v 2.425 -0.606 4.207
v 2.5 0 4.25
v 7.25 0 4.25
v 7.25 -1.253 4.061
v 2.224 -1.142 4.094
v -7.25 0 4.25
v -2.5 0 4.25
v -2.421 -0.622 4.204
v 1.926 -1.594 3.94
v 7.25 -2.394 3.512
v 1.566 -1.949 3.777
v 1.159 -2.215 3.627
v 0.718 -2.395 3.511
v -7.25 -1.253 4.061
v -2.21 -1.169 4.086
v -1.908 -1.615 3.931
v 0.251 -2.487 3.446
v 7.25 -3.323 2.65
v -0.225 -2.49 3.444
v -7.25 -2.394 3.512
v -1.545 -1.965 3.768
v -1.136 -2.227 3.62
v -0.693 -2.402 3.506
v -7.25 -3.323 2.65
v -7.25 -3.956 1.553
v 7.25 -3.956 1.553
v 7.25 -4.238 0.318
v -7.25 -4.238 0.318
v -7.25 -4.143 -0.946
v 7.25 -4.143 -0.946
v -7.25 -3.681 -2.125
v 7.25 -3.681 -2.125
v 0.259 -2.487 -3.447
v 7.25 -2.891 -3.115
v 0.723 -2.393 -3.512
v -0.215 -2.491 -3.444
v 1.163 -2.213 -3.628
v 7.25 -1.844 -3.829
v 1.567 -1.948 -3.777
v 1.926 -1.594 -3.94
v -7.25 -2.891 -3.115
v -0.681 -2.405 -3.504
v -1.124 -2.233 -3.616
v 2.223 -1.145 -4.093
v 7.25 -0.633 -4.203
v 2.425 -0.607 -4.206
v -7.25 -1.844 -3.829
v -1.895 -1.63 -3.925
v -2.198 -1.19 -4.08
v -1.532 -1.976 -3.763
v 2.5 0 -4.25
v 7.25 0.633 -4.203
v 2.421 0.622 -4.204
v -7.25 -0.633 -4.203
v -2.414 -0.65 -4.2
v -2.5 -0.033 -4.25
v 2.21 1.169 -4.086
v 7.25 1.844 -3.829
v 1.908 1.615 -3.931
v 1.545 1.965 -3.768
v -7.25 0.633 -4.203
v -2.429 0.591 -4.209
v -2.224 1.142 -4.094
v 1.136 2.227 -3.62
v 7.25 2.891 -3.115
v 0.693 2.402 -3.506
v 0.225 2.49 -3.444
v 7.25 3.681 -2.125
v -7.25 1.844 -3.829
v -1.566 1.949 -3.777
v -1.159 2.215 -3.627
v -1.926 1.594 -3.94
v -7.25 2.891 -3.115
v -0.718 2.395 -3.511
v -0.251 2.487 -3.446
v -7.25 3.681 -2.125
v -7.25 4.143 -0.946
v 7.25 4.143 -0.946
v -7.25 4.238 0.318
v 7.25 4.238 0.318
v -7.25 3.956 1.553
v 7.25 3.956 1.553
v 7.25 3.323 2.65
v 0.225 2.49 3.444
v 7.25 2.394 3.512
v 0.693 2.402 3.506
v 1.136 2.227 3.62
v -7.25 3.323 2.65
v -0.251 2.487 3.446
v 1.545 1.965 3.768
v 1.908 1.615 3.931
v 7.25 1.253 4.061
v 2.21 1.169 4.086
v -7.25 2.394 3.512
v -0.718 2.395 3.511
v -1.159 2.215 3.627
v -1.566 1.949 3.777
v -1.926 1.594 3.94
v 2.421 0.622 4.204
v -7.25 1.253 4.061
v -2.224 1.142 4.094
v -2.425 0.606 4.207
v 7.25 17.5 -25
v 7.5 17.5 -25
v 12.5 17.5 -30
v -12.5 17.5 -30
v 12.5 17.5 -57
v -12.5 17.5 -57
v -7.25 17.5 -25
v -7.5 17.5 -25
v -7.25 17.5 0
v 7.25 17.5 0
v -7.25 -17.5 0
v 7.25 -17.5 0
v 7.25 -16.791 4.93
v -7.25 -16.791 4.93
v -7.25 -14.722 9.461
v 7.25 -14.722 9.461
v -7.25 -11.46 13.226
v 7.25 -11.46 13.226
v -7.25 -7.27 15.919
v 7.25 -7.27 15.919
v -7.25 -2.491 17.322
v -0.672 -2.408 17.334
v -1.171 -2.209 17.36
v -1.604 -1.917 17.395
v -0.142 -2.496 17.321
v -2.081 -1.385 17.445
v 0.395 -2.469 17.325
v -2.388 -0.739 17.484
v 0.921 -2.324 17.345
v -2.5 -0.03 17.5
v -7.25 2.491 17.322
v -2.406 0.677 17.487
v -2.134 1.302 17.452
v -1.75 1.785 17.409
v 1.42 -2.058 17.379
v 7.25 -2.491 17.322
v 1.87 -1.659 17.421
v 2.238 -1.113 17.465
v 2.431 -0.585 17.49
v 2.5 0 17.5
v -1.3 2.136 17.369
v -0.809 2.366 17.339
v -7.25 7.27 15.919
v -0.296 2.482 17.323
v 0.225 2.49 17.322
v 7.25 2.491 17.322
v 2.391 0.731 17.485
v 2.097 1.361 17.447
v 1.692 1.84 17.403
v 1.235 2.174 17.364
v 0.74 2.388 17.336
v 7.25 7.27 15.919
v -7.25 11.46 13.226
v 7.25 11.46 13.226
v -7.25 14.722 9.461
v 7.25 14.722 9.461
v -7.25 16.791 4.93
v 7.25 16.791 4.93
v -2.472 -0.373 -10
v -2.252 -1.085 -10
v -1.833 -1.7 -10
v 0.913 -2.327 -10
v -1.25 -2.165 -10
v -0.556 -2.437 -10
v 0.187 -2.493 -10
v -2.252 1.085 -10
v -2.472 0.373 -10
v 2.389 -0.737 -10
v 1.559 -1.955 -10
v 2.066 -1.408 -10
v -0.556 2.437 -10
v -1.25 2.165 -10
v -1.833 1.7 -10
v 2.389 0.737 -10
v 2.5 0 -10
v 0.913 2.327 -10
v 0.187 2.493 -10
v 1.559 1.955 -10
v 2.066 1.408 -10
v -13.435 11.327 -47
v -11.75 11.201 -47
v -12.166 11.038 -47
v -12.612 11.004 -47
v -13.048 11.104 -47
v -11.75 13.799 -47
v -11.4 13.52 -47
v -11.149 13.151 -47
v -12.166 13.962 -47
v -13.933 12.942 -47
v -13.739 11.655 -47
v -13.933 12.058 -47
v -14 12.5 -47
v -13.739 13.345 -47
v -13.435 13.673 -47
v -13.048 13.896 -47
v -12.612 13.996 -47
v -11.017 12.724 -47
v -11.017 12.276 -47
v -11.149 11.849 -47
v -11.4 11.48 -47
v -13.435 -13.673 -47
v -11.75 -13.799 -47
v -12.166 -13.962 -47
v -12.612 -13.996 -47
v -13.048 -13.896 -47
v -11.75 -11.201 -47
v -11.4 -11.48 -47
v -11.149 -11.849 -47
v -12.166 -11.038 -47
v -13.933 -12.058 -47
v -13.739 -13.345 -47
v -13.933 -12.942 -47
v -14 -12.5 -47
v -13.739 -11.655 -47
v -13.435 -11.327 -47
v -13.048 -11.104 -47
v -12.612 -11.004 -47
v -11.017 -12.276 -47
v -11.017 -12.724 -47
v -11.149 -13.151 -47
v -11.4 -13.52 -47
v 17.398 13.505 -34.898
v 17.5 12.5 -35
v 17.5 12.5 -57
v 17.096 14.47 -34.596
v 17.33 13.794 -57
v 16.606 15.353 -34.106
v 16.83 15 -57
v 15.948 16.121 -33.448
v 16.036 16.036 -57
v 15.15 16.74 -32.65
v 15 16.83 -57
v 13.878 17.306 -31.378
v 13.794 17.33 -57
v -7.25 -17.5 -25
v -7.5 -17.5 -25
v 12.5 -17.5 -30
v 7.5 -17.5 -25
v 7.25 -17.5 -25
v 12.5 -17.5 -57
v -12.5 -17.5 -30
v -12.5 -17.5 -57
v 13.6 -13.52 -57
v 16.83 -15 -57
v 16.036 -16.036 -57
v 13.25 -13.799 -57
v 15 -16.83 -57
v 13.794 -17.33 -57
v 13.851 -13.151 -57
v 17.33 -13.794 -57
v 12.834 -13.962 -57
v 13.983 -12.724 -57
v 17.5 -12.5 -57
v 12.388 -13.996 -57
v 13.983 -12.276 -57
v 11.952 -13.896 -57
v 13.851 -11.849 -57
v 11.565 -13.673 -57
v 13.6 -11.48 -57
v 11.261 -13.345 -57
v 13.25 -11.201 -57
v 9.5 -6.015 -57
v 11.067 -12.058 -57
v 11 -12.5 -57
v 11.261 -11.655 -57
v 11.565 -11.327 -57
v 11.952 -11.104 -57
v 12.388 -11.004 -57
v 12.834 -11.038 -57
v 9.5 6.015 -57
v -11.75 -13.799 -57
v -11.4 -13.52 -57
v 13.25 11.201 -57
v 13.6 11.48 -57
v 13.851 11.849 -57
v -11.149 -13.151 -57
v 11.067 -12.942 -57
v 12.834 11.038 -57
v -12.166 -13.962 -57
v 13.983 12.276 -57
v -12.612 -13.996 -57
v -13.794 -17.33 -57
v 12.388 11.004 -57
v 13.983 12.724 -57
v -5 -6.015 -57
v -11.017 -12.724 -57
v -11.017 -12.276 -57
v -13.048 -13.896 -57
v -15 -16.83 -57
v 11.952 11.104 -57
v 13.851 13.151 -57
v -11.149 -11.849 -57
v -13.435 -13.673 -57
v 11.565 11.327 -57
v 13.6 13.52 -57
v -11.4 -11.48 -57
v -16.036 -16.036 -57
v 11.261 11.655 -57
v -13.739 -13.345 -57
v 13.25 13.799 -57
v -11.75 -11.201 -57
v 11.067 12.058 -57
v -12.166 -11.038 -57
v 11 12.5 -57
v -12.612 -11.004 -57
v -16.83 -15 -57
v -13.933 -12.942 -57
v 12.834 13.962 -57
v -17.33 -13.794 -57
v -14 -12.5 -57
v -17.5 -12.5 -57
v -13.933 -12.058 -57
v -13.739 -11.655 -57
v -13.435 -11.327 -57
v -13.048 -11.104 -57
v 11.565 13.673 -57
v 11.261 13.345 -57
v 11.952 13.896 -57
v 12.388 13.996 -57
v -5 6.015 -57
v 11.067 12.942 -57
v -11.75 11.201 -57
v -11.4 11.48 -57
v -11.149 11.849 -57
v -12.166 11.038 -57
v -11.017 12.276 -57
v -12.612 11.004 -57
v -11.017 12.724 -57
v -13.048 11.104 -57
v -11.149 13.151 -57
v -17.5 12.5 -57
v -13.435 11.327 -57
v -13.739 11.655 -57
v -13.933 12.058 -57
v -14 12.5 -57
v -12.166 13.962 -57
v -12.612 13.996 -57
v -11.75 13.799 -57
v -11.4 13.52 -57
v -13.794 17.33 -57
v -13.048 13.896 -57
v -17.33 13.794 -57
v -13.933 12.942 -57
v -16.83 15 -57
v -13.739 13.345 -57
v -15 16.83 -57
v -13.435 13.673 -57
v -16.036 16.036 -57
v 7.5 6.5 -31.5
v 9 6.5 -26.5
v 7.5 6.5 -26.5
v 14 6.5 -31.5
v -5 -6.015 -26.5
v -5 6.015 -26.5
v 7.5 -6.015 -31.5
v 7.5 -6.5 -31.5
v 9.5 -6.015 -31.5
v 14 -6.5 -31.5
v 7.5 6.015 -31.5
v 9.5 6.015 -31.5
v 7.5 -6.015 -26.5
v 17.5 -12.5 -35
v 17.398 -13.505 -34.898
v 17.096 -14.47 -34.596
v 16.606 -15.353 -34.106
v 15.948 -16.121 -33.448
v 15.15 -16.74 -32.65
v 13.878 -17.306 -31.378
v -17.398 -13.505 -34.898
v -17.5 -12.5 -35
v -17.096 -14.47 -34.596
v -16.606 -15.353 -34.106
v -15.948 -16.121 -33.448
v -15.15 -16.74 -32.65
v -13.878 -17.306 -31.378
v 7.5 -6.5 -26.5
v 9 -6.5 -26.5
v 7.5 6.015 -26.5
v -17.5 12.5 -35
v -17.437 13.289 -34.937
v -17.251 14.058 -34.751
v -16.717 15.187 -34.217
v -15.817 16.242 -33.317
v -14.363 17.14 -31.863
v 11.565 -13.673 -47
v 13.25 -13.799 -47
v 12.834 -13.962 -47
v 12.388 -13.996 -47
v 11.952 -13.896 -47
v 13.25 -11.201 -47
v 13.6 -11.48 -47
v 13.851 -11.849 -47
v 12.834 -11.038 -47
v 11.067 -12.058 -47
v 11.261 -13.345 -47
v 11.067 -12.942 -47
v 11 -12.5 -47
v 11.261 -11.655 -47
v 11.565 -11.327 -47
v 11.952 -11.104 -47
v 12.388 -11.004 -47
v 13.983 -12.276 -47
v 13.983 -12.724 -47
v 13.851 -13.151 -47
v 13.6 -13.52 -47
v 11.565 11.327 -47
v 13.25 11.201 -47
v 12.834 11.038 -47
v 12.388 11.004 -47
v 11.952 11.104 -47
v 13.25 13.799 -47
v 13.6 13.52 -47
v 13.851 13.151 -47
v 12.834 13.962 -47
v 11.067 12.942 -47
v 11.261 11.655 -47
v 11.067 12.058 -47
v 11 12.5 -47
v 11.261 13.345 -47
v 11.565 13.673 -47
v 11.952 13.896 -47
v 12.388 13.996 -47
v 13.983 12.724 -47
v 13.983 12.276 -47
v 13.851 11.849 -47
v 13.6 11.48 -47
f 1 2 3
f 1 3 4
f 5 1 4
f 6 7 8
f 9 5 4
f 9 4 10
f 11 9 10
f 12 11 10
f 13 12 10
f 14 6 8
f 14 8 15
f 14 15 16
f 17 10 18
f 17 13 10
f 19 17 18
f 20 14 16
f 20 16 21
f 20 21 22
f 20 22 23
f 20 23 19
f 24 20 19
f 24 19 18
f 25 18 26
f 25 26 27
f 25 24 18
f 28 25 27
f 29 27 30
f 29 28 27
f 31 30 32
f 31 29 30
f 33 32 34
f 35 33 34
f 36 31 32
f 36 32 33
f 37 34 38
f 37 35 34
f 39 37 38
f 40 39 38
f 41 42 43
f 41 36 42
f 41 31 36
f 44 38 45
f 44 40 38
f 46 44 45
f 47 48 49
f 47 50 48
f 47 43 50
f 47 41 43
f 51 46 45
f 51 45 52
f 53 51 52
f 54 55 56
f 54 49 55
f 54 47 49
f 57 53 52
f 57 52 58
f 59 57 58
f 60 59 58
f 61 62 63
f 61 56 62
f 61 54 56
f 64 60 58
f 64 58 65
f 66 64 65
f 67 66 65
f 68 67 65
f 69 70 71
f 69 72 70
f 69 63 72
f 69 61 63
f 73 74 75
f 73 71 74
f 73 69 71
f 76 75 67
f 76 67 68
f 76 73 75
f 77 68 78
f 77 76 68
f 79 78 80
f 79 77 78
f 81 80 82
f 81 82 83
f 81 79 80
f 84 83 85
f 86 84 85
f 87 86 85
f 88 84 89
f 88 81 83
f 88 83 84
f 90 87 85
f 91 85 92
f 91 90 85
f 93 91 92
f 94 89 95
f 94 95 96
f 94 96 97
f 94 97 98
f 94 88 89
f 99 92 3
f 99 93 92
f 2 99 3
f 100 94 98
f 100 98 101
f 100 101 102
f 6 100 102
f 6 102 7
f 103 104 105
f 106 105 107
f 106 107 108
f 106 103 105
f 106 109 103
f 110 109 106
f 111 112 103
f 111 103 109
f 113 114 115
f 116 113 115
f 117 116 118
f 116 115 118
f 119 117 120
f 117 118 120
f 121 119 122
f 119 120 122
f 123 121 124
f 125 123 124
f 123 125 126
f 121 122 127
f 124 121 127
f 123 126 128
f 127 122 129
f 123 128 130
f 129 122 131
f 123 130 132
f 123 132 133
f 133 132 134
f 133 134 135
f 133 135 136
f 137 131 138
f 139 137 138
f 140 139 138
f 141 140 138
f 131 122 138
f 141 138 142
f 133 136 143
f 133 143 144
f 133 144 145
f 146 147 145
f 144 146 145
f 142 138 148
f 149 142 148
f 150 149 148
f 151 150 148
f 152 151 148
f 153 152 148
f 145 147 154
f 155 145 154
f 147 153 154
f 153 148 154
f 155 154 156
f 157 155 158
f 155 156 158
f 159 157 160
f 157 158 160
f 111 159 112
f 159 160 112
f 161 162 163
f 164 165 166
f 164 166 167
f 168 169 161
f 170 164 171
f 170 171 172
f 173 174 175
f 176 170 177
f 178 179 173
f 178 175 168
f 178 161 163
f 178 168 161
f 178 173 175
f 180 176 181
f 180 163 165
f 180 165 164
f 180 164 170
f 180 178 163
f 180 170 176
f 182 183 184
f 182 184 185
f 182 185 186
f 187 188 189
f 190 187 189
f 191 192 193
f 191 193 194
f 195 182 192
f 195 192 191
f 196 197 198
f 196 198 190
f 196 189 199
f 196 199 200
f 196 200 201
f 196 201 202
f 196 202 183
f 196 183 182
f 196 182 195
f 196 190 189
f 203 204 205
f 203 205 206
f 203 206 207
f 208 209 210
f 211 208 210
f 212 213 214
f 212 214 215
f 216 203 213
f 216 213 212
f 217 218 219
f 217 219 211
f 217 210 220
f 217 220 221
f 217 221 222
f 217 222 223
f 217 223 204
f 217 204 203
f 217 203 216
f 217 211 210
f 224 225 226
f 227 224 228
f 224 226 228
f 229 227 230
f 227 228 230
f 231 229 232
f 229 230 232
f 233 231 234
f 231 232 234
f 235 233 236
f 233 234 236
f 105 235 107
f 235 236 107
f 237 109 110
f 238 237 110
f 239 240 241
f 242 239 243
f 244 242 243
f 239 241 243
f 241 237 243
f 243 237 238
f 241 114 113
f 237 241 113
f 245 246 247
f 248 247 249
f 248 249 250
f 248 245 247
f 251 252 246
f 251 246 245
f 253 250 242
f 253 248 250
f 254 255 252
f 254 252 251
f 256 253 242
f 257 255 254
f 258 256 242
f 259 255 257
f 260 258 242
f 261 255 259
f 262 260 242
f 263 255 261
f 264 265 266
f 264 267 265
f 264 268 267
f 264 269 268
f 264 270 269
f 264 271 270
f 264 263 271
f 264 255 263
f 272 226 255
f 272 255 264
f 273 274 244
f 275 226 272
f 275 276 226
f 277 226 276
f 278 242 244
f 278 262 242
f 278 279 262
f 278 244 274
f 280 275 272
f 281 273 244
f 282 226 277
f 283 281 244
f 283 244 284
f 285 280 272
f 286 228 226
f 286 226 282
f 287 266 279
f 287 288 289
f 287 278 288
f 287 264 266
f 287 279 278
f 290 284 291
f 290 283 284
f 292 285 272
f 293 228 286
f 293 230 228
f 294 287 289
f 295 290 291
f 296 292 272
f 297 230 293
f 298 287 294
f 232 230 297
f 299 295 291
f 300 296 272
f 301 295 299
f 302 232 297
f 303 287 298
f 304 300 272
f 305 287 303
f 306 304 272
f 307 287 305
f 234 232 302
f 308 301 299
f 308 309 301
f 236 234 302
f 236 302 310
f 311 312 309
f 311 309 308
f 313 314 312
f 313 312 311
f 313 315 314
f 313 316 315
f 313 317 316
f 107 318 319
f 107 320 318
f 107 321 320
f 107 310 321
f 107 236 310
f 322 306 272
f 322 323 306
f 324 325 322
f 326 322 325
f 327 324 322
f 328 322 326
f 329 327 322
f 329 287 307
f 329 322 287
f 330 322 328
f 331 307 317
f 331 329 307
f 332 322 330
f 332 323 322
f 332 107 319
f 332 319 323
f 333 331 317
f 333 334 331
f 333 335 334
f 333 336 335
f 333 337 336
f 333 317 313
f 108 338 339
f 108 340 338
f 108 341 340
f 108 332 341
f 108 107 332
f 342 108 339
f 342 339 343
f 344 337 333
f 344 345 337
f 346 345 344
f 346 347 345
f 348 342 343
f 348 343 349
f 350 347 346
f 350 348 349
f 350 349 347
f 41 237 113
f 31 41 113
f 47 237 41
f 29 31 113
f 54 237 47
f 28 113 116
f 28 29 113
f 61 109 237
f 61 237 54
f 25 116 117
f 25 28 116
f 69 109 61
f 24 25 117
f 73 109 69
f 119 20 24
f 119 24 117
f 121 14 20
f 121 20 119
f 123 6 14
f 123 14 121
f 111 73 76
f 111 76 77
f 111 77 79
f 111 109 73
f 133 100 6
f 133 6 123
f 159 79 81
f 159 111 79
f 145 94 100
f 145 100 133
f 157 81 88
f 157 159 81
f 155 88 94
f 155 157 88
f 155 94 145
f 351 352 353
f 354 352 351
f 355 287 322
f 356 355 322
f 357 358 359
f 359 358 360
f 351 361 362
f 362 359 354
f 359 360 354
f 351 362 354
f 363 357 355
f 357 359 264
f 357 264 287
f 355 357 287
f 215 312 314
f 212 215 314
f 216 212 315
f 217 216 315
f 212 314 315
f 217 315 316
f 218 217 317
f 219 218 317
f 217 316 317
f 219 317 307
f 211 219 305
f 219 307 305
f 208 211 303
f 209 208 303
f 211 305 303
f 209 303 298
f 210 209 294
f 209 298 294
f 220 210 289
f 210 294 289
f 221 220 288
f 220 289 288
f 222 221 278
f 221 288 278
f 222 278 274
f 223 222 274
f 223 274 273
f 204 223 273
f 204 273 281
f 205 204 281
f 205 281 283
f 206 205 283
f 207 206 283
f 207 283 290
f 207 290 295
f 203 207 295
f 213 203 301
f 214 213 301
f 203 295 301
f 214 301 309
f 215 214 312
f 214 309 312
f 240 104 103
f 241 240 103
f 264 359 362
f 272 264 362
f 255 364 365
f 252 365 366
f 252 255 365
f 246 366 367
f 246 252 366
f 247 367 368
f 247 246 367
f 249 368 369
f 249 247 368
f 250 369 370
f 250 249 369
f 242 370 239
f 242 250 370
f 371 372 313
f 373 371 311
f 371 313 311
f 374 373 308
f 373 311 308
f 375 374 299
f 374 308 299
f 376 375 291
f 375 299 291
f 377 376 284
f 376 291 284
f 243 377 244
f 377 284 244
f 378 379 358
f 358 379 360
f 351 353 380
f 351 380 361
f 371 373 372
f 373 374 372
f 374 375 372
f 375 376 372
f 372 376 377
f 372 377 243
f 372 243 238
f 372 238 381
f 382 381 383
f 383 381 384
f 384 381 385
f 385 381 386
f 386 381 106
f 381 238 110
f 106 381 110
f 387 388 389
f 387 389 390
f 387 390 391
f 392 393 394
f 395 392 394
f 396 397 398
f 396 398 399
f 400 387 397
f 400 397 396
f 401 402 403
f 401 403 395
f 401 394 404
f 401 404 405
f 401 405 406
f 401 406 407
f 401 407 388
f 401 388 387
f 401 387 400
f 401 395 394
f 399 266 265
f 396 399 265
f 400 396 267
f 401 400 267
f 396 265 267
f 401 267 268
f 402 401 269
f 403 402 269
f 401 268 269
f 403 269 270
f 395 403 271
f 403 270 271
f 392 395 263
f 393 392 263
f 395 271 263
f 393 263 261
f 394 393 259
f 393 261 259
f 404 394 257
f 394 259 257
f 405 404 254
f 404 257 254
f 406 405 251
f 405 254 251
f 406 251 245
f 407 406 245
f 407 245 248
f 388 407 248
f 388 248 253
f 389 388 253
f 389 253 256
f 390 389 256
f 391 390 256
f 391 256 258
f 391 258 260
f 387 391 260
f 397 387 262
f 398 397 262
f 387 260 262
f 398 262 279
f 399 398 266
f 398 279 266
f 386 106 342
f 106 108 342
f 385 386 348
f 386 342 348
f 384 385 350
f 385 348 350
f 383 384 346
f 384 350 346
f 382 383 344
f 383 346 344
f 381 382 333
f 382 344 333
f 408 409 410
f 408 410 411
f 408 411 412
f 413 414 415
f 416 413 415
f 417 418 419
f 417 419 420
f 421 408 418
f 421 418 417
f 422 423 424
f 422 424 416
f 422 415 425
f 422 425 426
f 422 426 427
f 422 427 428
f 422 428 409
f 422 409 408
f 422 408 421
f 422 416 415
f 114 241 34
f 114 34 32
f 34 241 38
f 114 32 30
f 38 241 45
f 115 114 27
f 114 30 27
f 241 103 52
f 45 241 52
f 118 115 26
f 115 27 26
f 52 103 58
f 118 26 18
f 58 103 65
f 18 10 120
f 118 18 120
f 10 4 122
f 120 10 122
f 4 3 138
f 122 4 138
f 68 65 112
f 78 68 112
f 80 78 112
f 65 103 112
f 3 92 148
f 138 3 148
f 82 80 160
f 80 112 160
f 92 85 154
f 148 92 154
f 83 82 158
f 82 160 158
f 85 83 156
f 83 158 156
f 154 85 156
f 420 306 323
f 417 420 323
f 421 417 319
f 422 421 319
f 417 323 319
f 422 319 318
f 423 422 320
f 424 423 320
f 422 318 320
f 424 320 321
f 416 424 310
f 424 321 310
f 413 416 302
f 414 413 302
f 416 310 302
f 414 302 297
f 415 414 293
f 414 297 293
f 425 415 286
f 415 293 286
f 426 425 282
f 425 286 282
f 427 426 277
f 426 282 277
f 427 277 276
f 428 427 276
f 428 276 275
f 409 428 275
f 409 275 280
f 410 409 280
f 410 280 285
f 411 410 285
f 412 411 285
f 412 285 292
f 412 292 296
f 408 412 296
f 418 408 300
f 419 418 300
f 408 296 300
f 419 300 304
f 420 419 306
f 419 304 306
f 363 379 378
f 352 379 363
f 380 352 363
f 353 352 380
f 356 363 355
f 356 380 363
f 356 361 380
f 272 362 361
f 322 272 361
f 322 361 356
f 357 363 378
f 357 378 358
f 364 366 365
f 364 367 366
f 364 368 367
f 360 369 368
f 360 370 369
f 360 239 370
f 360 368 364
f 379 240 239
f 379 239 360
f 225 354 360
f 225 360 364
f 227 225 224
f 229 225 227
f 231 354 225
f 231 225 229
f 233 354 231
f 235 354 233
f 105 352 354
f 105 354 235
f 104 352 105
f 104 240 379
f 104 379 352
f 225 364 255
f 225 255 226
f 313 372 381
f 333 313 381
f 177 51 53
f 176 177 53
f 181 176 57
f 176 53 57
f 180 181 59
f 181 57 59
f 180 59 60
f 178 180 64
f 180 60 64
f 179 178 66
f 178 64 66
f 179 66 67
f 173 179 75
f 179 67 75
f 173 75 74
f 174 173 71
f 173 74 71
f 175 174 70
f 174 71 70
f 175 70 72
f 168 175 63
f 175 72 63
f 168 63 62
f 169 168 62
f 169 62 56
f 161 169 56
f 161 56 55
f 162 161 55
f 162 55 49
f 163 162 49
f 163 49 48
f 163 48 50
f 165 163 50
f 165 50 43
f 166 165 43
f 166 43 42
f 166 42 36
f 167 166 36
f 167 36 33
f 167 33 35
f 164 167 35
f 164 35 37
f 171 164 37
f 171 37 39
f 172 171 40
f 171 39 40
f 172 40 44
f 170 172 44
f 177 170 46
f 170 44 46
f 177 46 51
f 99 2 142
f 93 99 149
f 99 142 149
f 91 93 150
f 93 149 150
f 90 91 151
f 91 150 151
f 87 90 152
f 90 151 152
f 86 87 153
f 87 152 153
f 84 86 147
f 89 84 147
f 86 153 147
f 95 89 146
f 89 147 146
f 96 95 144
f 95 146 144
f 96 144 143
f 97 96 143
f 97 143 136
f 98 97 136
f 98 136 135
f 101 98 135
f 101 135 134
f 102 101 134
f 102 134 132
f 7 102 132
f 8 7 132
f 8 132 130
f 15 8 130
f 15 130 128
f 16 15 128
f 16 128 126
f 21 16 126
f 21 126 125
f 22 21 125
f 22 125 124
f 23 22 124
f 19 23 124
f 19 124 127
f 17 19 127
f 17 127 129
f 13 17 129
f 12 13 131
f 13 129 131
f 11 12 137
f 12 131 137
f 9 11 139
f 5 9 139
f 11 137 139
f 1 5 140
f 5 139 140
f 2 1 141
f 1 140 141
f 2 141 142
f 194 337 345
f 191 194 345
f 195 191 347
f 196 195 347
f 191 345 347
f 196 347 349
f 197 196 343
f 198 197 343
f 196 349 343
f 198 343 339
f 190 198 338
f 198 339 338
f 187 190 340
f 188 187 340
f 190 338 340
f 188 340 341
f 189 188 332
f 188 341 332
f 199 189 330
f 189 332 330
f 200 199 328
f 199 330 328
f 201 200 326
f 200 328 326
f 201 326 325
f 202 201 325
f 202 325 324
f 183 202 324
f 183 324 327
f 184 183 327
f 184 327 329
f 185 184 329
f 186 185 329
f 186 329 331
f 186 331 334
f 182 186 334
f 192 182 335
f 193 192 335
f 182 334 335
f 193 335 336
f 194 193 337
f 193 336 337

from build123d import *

# Parameters (mm, degrees)
CROQUIS6_R              = 4.25
SALIENTE_EXTRUIR2_DEPTH = 7.25
CROQUIS7_W              = 35
CROQUIS7_H              = 35
SALIENTE_EXTRUIR3_DEPTH = 32
CHAFL_N1_SIZE           = 10
CROQUIS8_W              = 14.5
CROQUIS8_H              = 12.03
CORTAR_EXTRUIR4_DEPTH   = 30.5
CROQUIS9_W              = 5
CROQUIS9_H              = 13
CORTAR_EXTRUIR5_DEPTH   = 10
REDONDEO1_R             = 5
CROQUIS10_R             = 1.5
CORTAR_EXTRUIR6_DEPTH   = 10
CROQUIS11_R             = 2.5
CORTAR_EXTRUIR7_DEPTH   = 30


with BuildPart() as part:
    # Croquis6 → Saliente-Extruir2 (new, symmetric)
    with BuildSketch(Plane(origin=(0, 0, 0), x_dir=(0, 0, -1), z_dir=(1, 0, 0))):
        with BuildLine():
            Line((0, 17.5), (25, 17.5))
            Line((25, 17.5), (25, -17.5))
            Line((25, -17.5), (0, -17.5))
            ThreePointArc((0, -17.5), (-17.5, 0), (0, 17.5))
        make_face()
        with Locations(Location((0, 0, 0), (0, 0, 180))):
            Circle(CROQUIS6_R, mode=Mode.SUBTRACT)
    extrude(amount=SALIENTE_EXTRUIR2_DEPTH, both=True)

    # Croquis7 → Saliente-Extruir3 (add)
    with BuildSketch(Plane(origin=(0, 0, -25), x_dir=(-1, 0, 0), z_dir=(0, 0, -1))):
        Rectangle(CROQUIS7_W, CROQUIS7_H)
    extrude(amount=SALIENTE_EXTRUIR3_DEPTH)

    # Chaflán1
    chafl_n1_edges = [part.edges().sort_by_distance(p)[0] for p in [
        (-17.5, 0, -25),
        (17.5, 0, -25),
    ]]
    chamfer(chafl_n1_edges, length=CHAFL_N1_SIZE)

    # Croquis8 → Cortar-Extruir4 (cut)
    with BuildSketch(Plane(origin=(0, 0, -57), x_dir=(-1, 0, 0), z_dir=(0, 0, -1))):
        with Locations((-2.25, 0)):
            Rectangle(CROQUIS8_W, CROQUIS8_H)
    extrude(amount=-CORTAR_EXTRUIR4_DEPTH, mode=Mode.SUBTRACT)

    # Croquis9 → Cortar-Extruir5 (cut)
    with BuildSketch(Plane(origin=(17.5, 0, 0), x_dir=(0, 0, -1), z_dir=(1, 0, 0))):
        with Locations((29, 0)):
            Rectangle(CROQUIS9_W, CROQUIS9_H)
    extrude(amount=-CORTAR_EXTRUIR5_DEPTH, mode=Mode.SUBTRACT)

    # Redondeo1
    redondeo1_edges = [part.edges().sort_by_distance(p)[0] for p in [
        (-17.5, -17.5, -46),
        (-17.5, 17.5, -46),
        (17.5, 17.5, -46),
        (17.5, -17.5, -46),
    ]]
    fillet(redondeo1_edges, radius=REDONDEO1_R)

    # Croquis10 → Cortar-Extruir6 (cut)
    with BuildSketch(Plane(origin=(0, 0, -57), x_dir=(-1, 0, 0), z_dir=(0, 0, -1))):
        with Locations((-12.5, 12.5)):
            Circle(CROQUIS10_R)
        with Locations((12.5, 12.5)):
            Circle(CROQUIS10_R)
        with Locations((12.5, -12.5)):
            Circle(CROQUIS10_R)
        with Locations((-12.5, -12.5)):
            Circle(CROQUIS10_R)
    extrude(amount=-CORTAR_EXTRUIR6_DEPTH, mode=Mode.SUBTRACT)

    # Croquis11 → Cortar-Extruir7 (cut)
    with BuildSketch(Plane.XY.offset(20)):
        Circle(CROQUIS11_R)
    extrude(amount=-CORTAR_EXTRUIR7_DEPTH, mode=Mode.SUBTRACT)


solid = part.part
